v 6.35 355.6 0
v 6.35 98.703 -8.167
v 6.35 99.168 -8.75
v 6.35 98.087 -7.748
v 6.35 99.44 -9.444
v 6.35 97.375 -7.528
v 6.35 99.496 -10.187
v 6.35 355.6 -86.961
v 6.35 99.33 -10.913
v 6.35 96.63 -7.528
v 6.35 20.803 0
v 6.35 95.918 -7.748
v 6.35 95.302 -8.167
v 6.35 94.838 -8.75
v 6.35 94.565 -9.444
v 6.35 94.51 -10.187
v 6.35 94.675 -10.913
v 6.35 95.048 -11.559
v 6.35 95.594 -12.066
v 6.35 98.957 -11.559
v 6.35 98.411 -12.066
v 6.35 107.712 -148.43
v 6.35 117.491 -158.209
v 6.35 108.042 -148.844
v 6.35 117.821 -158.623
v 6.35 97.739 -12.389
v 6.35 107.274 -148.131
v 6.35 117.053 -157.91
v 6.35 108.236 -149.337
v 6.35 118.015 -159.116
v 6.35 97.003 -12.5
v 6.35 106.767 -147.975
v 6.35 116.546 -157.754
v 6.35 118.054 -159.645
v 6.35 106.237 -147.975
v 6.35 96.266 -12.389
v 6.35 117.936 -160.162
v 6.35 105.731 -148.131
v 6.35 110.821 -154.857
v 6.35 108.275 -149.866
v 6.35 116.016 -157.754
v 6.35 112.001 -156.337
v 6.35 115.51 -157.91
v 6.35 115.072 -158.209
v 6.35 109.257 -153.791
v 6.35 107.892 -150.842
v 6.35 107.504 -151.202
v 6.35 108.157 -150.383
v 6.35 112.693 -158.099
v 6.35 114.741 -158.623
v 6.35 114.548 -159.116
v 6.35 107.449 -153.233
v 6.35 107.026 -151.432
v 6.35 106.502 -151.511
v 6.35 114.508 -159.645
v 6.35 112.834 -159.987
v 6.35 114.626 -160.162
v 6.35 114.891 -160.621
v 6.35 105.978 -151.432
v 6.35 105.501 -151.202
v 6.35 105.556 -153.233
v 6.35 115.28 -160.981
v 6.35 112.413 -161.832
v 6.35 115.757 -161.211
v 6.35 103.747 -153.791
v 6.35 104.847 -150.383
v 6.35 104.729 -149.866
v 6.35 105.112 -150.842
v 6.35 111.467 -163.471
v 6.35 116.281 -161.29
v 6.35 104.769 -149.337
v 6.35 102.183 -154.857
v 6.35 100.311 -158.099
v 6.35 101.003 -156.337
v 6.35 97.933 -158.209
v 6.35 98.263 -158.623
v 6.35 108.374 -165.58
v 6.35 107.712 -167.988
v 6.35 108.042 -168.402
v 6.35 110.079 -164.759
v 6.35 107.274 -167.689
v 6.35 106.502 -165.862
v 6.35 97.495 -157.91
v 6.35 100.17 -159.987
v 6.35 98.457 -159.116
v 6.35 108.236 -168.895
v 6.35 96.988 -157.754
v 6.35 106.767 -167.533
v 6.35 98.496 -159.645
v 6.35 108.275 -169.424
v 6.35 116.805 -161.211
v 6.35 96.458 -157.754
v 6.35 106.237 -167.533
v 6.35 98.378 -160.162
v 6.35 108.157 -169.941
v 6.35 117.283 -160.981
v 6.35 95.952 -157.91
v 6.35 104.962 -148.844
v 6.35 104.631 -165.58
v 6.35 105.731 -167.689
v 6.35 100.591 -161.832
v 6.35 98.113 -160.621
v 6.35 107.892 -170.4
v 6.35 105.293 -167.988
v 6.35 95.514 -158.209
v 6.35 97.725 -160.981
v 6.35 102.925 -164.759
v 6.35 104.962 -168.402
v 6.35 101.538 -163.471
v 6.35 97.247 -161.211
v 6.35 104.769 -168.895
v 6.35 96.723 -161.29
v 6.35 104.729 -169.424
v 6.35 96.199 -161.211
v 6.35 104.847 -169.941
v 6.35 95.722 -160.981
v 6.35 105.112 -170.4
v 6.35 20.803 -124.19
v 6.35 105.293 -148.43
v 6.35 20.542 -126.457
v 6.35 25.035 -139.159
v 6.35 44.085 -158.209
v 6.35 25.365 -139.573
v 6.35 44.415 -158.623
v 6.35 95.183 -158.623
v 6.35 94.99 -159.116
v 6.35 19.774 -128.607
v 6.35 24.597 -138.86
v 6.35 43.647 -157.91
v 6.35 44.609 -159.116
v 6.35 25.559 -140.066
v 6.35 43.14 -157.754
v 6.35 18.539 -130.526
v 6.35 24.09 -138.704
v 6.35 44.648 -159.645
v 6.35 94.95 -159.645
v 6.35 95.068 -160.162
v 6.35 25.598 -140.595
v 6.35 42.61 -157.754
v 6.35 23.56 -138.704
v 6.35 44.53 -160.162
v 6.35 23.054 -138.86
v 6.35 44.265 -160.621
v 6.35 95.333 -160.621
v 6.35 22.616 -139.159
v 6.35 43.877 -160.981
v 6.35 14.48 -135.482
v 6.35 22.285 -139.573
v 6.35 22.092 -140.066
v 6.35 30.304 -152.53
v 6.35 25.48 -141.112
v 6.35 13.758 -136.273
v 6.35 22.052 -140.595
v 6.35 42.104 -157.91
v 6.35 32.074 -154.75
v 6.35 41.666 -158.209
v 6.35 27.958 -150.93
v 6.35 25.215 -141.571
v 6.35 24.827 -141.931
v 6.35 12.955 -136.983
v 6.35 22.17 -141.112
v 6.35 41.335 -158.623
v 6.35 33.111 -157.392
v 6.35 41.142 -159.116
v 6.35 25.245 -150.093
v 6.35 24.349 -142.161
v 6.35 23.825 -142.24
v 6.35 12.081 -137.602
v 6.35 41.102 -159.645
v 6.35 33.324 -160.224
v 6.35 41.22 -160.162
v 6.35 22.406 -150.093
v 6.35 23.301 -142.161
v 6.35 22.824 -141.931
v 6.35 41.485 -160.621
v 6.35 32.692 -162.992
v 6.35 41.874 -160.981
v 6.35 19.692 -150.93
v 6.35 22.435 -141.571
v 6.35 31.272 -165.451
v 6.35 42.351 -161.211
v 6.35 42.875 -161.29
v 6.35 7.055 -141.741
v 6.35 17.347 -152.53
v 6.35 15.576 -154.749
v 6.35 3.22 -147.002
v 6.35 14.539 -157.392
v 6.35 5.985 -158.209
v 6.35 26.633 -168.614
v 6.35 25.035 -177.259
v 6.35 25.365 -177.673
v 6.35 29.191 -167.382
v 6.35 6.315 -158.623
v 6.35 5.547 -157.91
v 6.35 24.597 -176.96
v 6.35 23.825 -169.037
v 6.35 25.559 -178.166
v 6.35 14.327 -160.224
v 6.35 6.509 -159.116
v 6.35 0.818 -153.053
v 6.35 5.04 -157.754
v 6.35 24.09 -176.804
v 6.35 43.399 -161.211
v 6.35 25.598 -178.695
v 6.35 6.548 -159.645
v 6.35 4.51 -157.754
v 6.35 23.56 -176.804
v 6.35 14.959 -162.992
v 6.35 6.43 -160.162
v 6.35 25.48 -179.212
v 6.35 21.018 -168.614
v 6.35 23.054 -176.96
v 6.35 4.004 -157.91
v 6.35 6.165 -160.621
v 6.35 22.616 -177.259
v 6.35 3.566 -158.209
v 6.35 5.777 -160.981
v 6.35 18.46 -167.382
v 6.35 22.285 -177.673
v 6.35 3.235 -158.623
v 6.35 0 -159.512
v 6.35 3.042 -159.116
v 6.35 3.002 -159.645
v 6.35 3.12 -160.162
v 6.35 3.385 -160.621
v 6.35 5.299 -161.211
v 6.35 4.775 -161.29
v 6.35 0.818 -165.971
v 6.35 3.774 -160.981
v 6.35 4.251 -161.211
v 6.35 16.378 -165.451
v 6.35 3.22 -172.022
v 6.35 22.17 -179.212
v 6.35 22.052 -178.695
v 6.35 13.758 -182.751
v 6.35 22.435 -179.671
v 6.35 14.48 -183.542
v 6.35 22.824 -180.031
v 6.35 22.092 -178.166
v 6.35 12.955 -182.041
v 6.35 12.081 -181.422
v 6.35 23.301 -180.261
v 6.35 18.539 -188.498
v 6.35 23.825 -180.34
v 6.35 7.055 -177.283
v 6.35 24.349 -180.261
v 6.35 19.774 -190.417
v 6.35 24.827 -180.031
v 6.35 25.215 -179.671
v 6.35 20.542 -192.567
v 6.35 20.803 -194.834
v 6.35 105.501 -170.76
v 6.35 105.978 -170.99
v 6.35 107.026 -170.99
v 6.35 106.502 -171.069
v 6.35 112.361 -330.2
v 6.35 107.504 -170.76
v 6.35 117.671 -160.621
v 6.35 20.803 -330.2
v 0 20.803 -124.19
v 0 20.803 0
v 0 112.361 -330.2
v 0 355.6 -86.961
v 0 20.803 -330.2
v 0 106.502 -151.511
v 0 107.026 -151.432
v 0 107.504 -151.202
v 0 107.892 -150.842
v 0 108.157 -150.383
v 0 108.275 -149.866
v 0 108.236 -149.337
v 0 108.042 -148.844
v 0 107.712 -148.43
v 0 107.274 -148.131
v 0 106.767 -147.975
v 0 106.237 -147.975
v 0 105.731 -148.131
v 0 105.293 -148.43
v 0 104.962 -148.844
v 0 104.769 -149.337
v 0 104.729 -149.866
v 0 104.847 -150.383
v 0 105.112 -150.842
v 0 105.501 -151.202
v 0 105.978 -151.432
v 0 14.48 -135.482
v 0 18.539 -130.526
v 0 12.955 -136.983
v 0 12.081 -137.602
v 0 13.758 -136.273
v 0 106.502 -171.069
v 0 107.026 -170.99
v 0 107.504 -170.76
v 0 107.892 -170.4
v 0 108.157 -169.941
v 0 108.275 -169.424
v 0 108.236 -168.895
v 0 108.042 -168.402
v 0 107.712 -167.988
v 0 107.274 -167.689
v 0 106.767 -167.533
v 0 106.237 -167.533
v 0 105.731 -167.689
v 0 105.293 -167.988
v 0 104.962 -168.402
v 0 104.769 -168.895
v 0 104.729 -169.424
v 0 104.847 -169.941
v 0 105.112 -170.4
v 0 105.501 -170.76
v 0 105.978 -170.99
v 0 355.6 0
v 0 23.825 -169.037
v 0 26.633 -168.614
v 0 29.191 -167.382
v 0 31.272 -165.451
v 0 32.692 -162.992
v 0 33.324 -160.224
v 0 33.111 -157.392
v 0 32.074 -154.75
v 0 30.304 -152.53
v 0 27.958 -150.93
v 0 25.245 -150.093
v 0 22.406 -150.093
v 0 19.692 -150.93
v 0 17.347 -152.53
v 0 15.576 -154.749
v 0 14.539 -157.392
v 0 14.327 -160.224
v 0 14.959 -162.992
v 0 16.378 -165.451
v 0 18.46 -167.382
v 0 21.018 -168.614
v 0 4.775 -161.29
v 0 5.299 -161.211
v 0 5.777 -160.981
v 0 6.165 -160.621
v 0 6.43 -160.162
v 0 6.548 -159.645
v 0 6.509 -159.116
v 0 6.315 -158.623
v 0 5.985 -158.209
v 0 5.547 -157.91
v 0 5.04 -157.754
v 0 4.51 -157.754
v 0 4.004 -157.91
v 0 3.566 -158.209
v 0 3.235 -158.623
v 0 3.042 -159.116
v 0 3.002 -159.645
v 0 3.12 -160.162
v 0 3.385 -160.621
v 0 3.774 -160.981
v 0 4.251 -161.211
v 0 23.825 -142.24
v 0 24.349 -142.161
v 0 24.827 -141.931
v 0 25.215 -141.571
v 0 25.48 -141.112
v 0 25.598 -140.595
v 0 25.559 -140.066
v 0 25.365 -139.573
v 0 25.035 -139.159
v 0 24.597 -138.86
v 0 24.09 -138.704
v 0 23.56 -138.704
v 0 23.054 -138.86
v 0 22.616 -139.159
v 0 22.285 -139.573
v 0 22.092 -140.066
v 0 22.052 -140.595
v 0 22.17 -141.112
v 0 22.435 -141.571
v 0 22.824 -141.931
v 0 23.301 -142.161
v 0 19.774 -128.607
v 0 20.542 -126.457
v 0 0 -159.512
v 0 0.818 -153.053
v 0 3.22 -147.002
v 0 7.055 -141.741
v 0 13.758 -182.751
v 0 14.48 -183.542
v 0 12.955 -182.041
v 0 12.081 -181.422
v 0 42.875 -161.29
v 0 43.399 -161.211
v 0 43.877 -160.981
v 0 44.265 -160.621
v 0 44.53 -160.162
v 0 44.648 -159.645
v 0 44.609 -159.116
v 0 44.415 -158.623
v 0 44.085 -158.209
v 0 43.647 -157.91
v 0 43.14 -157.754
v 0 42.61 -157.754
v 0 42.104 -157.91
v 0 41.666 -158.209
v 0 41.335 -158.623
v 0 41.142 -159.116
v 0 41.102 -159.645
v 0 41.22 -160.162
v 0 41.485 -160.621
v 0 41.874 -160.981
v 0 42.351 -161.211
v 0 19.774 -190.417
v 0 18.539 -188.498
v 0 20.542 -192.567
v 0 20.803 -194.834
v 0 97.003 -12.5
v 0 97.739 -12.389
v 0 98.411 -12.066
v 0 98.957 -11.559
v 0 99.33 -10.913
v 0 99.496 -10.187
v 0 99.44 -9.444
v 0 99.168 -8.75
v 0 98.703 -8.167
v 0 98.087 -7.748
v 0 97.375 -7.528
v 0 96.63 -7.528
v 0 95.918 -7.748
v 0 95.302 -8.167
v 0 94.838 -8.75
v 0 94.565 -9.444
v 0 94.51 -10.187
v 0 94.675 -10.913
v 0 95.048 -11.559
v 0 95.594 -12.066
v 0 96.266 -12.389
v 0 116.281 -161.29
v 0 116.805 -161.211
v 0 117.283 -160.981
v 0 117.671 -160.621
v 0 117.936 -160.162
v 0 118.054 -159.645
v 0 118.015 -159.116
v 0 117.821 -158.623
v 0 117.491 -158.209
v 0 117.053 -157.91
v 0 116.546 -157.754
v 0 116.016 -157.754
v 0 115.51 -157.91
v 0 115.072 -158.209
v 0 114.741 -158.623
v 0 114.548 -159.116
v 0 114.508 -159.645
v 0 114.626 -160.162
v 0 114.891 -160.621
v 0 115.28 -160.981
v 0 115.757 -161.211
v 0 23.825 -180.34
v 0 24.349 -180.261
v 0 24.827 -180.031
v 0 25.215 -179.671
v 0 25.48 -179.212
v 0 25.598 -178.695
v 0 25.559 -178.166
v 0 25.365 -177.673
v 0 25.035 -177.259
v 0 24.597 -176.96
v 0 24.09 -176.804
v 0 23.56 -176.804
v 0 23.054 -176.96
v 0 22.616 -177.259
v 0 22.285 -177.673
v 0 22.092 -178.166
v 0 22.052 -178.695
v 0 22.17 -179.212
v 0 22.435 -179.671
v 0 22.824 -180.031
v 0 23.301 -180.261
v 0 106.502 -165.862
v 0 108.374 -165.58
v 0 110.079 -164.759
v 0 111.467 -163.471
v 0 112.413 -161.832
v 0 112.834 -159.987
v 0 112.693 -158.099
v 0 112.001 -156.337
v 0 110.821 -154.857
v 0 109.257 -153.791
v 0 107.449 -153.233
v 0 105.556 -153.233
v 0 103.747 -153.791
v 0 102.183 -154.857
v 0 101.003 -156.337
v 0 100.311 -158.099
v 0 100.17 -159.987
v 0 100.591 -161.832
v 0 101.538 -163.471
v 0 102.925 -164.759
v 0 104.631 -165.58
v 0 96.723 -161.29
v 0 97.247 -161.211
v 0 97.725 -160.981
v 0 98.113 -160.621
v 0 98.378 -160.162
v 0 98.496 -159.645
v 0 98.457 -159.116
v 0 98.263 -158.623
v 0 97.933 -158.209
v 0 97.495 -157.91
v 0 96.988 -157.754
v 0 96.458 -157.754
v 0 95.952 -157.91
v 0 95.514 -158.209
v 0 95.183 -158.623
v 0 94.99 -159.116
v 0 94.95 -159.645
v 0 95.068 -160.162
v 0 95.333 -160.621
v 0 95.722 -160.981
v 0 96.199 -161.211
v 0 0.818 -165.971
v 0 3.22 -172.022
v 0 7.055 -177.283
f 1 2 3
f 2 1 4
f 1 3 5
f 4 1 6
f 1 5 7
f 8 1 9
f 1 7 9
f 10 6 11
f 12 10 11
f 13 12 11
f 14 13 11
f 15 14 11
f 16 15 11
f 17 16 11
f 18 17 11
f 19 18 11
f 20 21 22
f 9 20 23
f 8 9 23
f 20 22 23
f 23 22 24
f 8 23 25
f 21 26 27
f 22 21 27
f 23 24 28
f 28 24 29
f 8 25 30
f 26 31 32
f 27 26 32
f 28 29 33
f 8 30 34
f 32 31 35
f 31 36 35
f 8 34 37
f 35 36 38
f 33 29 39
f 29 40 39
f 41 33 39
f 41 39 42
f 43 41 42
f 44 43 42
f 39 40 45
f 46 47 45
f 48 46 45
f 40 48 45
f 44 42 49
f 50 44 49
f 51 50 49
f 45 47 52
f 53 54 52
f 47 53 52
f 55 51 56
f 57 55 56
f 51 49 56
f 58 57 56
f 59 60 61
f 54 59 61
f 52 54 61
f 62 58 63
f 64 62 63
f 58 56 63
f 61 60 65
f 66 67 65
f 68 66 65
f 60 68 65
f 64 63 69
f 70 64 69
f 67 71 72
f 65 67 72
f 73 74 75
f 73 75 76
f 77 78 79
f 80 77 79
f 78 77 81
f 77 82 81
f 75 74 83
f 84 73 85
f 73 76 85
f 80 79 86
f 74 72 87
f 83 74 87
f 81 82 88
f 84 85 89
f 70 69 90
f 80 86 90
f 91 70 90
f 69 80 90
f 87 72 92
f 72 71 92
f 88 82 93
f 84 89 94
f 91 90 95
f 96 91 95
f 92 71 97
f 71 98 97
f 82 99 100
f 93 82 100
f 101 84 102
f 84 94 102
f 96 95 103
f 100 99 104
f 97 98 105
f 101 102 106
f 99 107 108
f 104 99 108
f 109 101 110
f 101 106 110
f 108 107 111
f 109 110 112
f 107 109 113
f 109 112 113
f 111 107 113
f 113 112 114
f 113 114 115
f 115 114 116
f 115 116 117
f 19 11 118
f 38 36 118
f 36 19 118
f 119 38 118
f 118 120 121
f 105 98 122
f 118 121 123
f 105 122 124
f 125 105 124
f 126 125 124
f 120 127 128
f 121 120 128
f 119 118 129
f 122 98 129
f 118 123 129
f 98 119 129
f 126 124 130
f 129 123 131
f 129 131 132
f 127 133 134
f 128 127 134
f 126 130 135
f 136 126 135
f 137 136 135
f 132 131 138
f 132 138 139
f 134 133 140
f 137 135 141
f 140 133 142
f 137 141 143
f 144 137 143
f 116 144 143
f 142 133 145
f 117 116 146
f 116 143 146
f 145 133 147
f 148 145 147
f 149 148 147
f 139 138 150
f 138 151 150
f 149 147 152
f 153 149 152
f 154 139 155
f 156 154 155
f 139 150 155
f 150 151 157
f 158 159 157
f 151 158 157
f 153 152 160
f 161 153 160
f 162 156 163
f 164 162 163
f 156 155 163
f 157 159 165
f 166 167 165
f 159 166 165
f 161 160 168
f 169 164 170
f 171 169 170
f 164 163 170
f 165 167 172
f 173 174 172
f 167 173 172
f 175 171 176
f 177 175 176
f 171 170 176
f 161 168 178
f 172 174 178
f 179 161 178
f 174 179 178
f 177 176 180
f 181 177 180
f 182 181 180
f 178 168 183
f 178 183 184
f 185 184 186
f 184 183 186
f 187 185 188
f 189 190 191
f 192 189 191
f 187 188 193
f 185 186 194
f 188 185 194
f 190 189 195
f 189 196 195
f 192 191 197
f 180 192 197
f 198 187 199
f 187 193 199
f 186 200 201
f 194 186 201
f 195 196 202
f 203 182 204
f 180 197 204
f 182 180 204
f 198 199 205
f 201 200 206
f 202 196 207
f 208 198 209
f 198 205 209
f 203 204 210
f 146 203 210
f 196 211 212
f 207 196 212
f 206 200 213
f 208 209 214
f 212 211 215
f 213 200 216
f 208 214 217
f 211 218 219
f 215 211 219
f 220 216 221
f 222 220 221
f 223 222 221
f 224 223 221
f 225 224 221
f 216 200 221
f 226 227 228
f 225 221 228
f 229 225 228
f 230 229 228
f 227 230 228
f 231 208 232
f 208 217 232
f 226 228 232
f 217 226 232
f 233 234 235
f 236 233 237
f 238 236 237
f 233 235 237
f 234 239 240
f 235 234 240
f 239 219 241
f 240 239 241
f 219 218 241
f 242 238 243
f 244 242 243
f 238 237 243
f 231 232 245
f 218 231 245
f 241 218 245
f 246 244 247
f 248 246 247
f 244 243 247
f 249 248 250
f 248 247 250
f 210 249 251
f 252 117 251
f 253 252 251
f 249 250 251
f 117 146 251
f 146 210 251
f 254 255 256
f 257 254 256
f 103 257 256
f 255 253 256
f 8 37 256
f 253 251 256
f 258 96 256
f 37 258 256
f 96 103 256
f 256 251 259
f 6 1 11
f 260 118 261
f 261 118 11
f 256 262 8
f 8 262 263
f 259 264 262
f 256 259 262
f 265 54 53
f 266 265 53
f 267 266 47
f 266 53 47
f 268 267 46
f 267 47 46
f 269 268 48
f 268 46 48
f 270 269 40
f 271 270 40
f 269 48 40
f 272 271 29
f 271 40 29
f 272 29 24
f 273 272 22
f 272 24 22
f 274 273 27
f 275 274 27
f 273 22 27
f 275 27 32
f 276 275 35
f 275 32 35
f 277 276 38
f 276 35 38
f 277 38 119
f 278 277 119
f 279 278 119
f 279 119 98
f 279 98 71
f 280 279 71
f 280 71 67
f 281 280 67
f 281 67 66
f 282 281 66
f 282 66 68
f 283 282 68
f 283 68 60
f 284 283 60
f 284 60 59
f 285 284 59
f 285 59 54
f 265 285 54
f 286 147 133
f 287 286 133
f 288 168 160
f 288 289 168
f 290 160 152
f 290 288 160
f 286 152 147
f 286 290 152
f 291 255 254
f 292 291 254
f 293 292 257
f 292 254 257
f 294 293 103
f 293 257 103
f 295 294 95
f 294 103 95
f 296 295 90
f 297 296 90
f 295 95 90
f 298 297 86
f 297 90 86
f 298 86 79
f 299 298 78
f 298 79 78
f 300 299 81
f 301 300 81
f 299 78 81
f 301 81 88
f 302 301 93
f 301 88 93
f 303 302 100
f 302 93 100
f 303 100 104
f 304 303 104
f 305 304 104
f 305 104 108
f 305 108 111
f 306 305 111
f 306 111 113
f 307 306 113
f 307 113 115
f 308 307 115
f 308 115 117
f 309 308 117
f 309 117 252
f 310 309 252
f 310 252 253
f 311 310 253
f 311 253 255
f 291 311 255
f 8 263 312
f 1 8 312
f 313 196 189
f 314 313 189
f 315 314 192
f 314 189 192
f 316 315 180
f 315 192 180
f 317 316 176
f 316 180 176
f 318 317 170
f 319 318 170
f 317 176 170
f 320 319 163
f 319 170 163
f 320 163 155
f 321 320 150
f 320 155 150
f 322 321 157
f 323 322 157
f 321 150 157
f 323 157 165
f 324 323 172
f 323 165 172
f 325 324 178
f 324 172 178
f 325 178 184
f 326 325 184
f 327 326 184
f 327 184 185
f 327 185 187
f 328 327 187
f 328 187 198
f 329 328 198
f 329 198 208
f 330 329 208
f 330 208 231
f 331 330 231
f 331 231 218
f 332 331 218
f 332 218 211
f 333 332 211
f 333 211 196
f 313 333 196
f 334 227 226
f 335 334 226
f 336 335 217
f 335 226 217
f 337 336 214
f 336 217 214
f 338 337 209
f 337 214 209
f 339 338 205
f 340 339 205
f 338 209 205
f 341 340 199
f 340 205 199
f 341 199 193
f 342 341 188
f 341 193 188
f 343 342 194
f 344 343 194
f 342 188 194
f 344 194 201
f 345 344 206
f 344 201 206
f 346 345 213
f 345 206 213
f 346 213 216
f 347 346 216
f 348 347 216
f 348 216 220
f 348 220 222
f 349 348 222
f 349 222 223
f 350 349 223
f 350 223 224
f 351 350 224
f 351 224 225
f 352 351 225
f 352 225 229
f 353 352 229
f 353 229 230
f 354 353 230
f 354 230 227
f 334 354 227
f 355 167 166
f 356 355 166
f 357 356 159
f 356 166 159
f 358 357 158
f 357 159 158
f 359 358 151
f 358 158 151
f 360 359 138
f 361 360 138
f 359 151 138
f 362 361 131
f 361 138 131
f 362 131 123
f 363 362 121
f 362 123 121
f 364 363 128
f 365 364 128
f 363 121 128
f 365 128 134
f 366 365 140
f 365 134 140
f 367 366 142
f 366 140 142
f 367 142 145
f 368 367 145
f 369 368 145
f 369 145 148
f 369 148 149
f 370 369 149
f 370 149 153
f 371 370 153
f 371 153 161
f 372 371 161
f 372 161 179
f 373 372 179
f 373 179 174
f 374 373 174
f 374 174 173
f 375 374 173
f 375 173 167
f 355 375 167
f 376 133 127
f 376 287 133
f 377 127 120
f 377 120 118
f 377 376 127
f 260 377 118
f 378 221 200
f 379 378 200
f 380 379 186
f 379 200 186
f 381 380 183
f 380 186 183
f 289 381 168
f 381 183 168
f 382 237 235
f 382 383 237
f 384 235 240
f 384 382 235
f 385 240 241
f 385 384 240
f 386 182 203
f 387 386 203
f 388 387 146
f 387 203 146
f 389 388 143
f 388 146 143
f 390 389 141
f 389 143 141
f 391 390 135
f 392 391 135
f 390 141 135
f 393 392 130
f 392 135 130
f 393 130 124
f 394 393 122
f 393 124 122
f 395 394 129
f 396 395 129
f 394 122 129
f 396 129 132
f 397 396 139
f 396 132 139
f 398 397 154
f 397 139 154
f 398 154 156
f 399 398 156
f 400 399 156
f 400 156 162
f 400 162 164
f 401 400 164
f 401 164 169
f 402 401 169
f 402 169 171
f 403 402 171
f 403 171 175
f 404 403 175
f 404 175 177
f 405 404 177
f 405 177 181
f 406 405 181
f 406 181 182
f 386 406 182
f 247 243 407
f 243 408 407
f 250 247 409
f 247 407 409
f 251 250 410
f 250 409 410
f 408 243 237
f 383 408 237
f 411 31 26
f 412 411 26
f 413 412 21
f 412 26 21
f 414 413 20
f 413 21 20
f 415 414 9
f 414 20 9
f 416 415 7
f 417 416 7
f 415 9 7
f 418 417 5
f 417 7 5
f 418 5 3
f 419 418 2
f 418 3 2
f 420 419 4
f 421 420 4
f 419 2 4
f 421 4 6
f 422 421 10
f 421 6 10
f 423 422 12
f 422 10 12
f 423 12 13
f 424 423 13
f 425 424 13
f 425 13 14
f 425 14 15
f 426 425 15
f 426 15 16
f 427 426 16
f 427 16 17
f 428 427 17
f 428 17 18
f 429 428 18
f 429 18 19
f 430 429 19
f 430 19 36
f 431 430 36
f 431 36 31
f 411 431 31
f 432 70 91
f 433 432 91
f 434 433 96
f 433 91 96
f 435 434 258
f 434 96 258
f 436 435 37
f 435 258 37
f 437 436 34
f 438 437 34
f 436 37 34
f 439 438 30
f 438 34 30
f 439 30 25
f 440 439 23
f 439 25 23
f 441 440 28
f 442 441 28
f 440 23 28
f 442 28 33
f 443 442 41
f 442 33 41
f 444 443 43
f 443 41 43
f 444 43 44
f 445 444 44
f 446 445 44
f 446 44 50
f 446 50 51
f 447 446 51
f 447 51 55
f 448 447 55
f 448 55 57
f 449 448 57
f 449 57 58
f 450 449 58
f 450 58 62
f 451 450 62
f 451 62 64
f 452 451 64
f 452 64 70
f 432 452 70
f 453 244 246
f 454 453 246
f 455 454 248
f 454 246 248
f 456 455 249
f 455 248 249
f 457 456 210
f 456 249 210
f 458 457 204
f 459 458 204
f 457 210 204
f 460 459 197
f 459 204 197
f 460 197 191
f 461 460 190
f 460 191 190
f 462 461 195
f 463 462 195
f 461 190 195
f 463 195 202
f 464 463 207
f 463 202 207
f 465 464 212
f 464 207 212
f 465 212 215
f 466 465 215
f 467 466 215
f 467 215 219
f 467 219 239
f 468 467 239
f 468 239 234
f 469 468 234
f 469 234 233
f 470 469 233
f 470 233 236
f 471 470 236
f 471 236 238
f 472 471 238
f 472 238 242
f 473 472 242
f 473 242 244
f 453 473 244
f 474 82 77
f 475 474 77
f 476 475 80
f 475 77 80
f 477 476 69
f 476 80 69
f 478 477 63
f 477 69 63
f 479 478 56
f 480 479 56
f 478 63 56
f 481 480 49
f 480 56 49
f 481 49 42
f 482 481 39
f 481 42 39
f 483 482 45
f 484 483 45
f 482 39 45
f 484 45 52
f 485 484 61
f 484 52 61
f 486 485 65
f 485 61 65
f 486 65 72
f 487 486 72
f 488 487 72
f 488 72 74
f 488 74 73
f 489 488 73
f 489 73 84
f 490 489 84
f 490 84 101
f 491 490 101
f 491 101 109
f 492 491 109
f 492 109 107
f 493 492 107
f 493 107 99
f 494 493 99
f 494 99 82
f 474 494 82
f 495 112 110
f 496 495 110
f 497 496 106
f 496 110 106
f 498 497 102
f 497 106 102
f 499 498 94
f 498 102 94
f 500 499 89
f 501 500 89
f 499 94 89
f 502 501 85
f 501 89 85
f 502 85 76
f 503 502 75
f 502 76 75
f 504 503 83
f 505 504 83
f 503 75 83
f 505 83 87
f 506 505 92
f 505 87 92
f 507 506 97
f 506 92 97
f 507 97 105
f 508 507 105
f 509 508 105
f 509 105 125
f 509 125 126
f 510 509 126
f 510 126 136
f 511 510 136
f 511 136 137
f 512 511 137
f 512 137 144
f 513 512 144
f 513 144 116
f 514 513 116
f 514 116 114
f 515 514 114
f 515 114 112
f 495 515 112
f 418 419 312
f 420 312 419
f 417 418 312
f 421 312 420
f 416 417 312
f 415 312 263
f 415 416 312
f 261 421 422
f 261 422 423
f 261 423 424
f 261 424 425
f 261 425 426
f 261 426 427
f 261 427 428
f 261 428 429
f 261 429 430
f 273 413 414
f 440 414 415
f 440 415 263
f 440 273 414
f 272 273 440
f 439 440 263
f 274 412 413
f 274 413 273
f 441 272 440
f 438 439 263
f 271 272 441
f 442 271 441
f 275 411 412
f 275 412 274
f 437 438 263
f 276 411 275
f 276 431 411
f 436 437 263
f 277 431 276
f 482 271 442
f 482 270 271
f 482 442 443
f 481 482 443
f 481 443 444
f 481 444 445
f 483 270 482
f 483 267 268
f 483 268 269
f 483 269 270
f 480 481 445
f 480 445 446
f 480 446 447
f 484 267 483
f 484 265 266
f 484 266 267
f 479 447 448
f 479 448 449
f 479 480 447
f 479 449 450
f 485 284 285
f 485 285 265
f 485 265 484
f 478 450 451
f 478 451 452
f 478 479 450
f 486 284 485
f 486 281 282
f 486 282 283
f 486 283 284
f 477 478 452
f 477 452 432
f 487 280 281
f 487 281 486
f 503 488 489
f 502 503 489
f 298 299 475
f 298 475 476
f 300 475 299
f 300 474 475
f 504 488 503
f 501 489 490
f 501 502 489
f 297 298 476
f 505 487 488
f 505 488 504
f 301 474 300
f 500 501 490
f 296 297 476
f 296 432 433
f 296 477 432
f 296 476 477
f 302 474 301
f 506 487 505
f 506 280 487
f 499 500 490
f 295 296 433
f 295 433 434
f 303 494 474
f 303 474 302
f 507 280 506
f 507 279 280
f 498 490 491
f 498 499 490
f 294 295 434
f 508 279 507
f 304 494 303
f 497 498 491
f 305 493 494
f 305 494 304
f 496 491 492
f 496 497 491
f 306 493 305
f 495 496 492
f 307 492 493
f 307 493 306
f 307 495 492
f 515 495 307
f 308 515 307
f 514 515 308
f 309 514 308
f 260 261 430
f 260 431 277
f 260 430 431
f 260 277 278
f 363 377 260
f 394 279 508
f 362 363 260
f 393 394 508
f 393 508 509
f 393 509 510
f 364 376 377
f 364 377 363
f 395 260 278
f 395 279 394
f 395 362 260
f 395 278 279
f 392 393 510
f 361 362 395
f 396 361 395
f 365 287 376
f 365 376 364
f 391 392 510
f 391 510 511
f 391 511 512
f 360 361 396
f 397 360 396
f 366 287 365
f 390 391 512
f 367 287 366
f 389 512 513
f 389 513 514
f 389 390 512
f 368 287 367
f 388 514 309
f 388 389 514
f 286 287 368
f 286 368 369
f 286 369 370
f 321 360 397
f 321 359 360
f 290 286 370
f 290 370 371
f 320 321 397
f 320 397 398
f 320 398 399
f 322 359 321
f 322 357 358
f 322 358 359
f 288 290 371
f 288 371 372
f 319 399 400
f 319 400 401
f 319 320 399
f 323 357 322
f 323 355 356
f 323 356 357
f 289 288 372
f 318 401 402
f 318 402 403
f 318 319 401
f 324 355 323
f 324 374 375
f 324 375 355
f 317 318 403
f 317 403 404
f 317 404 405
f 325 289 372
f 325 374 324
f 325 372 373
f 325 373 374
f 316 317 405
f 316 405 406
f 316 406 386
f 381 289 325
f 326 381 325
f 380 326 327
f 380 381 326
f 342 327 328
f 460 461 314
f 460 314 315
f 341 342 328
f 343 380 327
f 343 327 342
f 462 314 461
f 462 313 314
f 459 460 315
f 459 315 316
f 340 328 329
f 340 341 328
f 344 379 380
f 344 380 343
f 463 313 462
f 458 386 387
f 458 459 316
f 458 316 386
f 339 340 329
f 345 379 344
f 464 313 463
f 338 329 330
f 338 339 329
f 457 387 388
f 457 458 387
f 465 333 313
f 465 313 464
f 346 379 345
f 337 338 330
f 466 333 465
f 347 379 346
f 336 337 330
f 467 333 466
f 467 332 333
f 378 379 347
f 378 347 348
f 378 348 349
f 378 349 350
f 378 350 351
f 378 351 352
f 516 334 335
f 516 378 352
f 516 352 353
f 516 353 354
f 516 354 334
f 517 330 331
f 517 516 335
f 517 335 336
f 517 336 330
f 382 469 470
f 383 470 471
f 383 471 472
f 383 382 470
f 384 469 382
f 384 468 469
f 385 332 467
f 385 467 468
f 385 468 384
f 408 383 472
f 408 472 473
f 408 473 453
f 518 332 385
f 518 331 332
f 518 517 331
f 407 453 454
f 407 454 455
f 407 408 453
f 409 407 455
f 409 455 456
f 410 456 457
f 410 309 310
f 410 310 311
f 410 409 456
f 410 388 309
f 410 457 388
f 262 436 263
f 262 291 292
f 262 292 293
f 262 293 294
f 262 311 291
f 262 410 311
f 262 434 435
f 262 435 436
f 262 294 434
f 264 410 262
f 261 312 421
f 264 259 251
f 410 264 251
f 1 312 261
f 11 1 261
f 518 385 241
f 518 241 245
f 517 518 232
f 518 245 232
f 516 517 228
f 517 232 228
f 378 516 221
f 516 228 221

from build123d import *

# Parameters (mm, degrees)
MAIN_PLATE_SIZE_DEPTH                         = 6.35
SKETCH2_R                                     = 9.525
SKETCH2_R_2                                   = 1.778
BOTTOM_SHAFT_MOUNTING_HOLES_DEPTH             = 486.307863629
SKETCH3_R                                     = 6.35
SKETCH3_R_2                                   = 1.778
TOP_BATTERY_BOX_MOUNTING_HOLES_DEPTH          = 486.307863629
THIS_IS_TO_MATCH_THE_IDIOTIC_DESIGN_OF_B_SIZE = 6.35
THIS_IS_TO_MATCH_THE_IDIOTIC_DESIGN_2_R       = 10
SKETCH4_R                                     = 2.5
F_20MM_EXTRUSION_MOUNT_DEPTH                  = 486.307863629


with BuildPart() as part:
    # Sketch1 → Main Plate Size (new body)
    with BuildSketch(Plane(origin=(0, 0, 0), x_dir=(0, 0, -1), z_dir=(1, 0, 0))):
        Polygon((330.2, 112.361360549), (86.961360549, 355.6), (0, 355.6), (0, 0), (330.2, 0), align=None)
    extrude(amount=MAIN_PLATE_SIZE_DEPTH)

    # Sketch2 → Bottom Shaft Mounting Holes (cut, through all)
    with BuildSketch(Plane(origin=(6.35, 0, 0), x_dir=(0, 0, -1), z_dir=(1, 0, 0))):
        with BuildLine():
            Line((134.1120127, 20.8026), (0, 20.8026))
            Line((0, 20.8026), (0, 0))
            Line((0, 0), (159.512000023, 0))
            ThreePointArc((159.512000023, 0), (143.096249024, 5.864358018), (134.1120127, 20.8026))
        make_face()
        with BuildLine():
            ThreePointArc((184.9119873, 20.8026), (175.927750994, 5.864358033), (159.512000023, 0))
            Line((159.512000023, 0), (177.8, 0))
            Line((177.8, 0), (330.2, 0))
            Line((330.2, 0), (330.2, 20.8026))
            Line((330.2, 20.8026), (184.9119873, 20.8026))
        make_face()
        with Locations((159.512, 23.8252)):
            Circle(SKETCH2_R)
        with Locations((159.512, 4.7752)):
            Circle(SKETCH2_R_2)
        with Locations((178.562, 23.8252)):
            Circle(SKETCH2_R_2)
        with Locations((159.512, 42.8752)):
            Circle(SKETCH2_R_2)
        with Locations((140.462, 23.8252)):
            Circle(SKETCH2_R_2)
    extrude(amount=-BOTTOM_SHAFT_MOUNTING_HOLES_DEPTH, mode=Mode.SUBTRACT)

    # Sketch3 → Top Battery Box Mounting Holes (cut, through all)
    with BuildSketch(Plane(origin=(6.35, 0, 0), x_dir=(0, 0, -1), z_dir=(1, 0, 0))):
        with Locations((159.512, 106.5022)):
            Circle(SKETCH3_R)
        with Locations((149.733, 106.5022)):
            Circle(SKETCH3_R_2)
        with Locations((159.512, 116.2812)):
            Circle(SKETCH3_R_2)
        with Locations((169.291, 106.5022)):
            Circle(SKETCH3_R_2)
        with Locations((159.512, 96.7232)):
            Circle(SKETCH3_R_2)
    extrude(amount=-TOP_BATTERY_BOX_MOUNTING_HOLES_DEPTH, mode=Mode.SUBTRACT)

    # This is to match the idiotic Design of B
    # the kernel refuses this chamfer: 6.35 mm, written as the material it adds along each edge
    with BuildSketch(Plane(origin=(6.35, 20.8026, -134.1120127), x_dir=(0, -0.9387383646661523, -0.34463064678568256), z_dir=(-1, 0, 0))) as this_is_to_match_the_idiotic_design_of_b_piece_1:
        with BuildLine():
            Line((7.921958409, 0), (-THIS_IS_TO_MATCH_THE_IDIOTIC_DESIGN_OF_B_SIZE * 0.344630646786, THIS_IS_TO_MATCH_THE_IDIOTIC_DESIGN_OF_B_SIZE * 0.938738364666))
            Line((-THIS_IS_TO_MATCH_THE_IDIOTIC_DESIGN_OF_B_SIZE * 0.344630646786, THIS_IS_TO_MATCH_THE_IDIOTIC_DESIGN_OF_B_SIZE * 0.938738364666), (0, 0))
            ThreePointArc((0, 0), (4.071959946, 0.304342453), (7.921958409, 0))
        make_face()
    extrude(amount=6.35)
    with BuildSketch(Plane(origin=(6.35, 20.8026, -184.9119873), x_dir=(0, 0, -1), z_dir=(-1, 0, 0))) as this_is_to_match_the_idiotic_design_of_b_piece_2:
        with BuildLine():
            Line((THIS_IS_TO_MATCH_THE_IDIOTIC_DESIGN_OF_B_SIZE, 0), (-2.73014965, 7.436646282))
            ThreePointArc((-2.73014965, 7.436646282), (-1.117624253, 3.927390757), (0, 0))
            Line((0, 0), (THIS_IS_TO_MATCH_THE_IDIOTIC_DESIGN_OF_B_SIZE, 0))
        make_face()
    extrude(amount=6.35)

    # This is to match the idiotic Design  2
    this_is_to_match_the_idiotic_design_2_edges = [part.edges().sort_by_distance(p)[0] for p in [
        (3.175, 13.365953718, -136.84216235),
        (3.175, 13.365953718, -182.18183765),
        (3.175, 20.8026, -191.2619873),
        (3.175, 20.8026, -127.7620127),
    ]]
    fillet(this_is_to_match_the_idiotic_design_2_edges, radius=THIS_IS_TO_MATCH_THE_IDIOTIC_DESIGN_2_R)

    # Sketch4 → 20mm Extrusion Mount (cut, through all)
    with BuildSketch(Plane(origin=(6.35, 0, 0), x_dir=(0, 0, -1), z_dir=(1, 0, 0))):
        with Locations((10, 97.0026)):
            Circle(SKETCH4_R)
    extrude(amount=-F_20MM_EXTRUSION_MOUNT_DEPTH, mode=Mode.SUBTRACT)


solid = part.part
